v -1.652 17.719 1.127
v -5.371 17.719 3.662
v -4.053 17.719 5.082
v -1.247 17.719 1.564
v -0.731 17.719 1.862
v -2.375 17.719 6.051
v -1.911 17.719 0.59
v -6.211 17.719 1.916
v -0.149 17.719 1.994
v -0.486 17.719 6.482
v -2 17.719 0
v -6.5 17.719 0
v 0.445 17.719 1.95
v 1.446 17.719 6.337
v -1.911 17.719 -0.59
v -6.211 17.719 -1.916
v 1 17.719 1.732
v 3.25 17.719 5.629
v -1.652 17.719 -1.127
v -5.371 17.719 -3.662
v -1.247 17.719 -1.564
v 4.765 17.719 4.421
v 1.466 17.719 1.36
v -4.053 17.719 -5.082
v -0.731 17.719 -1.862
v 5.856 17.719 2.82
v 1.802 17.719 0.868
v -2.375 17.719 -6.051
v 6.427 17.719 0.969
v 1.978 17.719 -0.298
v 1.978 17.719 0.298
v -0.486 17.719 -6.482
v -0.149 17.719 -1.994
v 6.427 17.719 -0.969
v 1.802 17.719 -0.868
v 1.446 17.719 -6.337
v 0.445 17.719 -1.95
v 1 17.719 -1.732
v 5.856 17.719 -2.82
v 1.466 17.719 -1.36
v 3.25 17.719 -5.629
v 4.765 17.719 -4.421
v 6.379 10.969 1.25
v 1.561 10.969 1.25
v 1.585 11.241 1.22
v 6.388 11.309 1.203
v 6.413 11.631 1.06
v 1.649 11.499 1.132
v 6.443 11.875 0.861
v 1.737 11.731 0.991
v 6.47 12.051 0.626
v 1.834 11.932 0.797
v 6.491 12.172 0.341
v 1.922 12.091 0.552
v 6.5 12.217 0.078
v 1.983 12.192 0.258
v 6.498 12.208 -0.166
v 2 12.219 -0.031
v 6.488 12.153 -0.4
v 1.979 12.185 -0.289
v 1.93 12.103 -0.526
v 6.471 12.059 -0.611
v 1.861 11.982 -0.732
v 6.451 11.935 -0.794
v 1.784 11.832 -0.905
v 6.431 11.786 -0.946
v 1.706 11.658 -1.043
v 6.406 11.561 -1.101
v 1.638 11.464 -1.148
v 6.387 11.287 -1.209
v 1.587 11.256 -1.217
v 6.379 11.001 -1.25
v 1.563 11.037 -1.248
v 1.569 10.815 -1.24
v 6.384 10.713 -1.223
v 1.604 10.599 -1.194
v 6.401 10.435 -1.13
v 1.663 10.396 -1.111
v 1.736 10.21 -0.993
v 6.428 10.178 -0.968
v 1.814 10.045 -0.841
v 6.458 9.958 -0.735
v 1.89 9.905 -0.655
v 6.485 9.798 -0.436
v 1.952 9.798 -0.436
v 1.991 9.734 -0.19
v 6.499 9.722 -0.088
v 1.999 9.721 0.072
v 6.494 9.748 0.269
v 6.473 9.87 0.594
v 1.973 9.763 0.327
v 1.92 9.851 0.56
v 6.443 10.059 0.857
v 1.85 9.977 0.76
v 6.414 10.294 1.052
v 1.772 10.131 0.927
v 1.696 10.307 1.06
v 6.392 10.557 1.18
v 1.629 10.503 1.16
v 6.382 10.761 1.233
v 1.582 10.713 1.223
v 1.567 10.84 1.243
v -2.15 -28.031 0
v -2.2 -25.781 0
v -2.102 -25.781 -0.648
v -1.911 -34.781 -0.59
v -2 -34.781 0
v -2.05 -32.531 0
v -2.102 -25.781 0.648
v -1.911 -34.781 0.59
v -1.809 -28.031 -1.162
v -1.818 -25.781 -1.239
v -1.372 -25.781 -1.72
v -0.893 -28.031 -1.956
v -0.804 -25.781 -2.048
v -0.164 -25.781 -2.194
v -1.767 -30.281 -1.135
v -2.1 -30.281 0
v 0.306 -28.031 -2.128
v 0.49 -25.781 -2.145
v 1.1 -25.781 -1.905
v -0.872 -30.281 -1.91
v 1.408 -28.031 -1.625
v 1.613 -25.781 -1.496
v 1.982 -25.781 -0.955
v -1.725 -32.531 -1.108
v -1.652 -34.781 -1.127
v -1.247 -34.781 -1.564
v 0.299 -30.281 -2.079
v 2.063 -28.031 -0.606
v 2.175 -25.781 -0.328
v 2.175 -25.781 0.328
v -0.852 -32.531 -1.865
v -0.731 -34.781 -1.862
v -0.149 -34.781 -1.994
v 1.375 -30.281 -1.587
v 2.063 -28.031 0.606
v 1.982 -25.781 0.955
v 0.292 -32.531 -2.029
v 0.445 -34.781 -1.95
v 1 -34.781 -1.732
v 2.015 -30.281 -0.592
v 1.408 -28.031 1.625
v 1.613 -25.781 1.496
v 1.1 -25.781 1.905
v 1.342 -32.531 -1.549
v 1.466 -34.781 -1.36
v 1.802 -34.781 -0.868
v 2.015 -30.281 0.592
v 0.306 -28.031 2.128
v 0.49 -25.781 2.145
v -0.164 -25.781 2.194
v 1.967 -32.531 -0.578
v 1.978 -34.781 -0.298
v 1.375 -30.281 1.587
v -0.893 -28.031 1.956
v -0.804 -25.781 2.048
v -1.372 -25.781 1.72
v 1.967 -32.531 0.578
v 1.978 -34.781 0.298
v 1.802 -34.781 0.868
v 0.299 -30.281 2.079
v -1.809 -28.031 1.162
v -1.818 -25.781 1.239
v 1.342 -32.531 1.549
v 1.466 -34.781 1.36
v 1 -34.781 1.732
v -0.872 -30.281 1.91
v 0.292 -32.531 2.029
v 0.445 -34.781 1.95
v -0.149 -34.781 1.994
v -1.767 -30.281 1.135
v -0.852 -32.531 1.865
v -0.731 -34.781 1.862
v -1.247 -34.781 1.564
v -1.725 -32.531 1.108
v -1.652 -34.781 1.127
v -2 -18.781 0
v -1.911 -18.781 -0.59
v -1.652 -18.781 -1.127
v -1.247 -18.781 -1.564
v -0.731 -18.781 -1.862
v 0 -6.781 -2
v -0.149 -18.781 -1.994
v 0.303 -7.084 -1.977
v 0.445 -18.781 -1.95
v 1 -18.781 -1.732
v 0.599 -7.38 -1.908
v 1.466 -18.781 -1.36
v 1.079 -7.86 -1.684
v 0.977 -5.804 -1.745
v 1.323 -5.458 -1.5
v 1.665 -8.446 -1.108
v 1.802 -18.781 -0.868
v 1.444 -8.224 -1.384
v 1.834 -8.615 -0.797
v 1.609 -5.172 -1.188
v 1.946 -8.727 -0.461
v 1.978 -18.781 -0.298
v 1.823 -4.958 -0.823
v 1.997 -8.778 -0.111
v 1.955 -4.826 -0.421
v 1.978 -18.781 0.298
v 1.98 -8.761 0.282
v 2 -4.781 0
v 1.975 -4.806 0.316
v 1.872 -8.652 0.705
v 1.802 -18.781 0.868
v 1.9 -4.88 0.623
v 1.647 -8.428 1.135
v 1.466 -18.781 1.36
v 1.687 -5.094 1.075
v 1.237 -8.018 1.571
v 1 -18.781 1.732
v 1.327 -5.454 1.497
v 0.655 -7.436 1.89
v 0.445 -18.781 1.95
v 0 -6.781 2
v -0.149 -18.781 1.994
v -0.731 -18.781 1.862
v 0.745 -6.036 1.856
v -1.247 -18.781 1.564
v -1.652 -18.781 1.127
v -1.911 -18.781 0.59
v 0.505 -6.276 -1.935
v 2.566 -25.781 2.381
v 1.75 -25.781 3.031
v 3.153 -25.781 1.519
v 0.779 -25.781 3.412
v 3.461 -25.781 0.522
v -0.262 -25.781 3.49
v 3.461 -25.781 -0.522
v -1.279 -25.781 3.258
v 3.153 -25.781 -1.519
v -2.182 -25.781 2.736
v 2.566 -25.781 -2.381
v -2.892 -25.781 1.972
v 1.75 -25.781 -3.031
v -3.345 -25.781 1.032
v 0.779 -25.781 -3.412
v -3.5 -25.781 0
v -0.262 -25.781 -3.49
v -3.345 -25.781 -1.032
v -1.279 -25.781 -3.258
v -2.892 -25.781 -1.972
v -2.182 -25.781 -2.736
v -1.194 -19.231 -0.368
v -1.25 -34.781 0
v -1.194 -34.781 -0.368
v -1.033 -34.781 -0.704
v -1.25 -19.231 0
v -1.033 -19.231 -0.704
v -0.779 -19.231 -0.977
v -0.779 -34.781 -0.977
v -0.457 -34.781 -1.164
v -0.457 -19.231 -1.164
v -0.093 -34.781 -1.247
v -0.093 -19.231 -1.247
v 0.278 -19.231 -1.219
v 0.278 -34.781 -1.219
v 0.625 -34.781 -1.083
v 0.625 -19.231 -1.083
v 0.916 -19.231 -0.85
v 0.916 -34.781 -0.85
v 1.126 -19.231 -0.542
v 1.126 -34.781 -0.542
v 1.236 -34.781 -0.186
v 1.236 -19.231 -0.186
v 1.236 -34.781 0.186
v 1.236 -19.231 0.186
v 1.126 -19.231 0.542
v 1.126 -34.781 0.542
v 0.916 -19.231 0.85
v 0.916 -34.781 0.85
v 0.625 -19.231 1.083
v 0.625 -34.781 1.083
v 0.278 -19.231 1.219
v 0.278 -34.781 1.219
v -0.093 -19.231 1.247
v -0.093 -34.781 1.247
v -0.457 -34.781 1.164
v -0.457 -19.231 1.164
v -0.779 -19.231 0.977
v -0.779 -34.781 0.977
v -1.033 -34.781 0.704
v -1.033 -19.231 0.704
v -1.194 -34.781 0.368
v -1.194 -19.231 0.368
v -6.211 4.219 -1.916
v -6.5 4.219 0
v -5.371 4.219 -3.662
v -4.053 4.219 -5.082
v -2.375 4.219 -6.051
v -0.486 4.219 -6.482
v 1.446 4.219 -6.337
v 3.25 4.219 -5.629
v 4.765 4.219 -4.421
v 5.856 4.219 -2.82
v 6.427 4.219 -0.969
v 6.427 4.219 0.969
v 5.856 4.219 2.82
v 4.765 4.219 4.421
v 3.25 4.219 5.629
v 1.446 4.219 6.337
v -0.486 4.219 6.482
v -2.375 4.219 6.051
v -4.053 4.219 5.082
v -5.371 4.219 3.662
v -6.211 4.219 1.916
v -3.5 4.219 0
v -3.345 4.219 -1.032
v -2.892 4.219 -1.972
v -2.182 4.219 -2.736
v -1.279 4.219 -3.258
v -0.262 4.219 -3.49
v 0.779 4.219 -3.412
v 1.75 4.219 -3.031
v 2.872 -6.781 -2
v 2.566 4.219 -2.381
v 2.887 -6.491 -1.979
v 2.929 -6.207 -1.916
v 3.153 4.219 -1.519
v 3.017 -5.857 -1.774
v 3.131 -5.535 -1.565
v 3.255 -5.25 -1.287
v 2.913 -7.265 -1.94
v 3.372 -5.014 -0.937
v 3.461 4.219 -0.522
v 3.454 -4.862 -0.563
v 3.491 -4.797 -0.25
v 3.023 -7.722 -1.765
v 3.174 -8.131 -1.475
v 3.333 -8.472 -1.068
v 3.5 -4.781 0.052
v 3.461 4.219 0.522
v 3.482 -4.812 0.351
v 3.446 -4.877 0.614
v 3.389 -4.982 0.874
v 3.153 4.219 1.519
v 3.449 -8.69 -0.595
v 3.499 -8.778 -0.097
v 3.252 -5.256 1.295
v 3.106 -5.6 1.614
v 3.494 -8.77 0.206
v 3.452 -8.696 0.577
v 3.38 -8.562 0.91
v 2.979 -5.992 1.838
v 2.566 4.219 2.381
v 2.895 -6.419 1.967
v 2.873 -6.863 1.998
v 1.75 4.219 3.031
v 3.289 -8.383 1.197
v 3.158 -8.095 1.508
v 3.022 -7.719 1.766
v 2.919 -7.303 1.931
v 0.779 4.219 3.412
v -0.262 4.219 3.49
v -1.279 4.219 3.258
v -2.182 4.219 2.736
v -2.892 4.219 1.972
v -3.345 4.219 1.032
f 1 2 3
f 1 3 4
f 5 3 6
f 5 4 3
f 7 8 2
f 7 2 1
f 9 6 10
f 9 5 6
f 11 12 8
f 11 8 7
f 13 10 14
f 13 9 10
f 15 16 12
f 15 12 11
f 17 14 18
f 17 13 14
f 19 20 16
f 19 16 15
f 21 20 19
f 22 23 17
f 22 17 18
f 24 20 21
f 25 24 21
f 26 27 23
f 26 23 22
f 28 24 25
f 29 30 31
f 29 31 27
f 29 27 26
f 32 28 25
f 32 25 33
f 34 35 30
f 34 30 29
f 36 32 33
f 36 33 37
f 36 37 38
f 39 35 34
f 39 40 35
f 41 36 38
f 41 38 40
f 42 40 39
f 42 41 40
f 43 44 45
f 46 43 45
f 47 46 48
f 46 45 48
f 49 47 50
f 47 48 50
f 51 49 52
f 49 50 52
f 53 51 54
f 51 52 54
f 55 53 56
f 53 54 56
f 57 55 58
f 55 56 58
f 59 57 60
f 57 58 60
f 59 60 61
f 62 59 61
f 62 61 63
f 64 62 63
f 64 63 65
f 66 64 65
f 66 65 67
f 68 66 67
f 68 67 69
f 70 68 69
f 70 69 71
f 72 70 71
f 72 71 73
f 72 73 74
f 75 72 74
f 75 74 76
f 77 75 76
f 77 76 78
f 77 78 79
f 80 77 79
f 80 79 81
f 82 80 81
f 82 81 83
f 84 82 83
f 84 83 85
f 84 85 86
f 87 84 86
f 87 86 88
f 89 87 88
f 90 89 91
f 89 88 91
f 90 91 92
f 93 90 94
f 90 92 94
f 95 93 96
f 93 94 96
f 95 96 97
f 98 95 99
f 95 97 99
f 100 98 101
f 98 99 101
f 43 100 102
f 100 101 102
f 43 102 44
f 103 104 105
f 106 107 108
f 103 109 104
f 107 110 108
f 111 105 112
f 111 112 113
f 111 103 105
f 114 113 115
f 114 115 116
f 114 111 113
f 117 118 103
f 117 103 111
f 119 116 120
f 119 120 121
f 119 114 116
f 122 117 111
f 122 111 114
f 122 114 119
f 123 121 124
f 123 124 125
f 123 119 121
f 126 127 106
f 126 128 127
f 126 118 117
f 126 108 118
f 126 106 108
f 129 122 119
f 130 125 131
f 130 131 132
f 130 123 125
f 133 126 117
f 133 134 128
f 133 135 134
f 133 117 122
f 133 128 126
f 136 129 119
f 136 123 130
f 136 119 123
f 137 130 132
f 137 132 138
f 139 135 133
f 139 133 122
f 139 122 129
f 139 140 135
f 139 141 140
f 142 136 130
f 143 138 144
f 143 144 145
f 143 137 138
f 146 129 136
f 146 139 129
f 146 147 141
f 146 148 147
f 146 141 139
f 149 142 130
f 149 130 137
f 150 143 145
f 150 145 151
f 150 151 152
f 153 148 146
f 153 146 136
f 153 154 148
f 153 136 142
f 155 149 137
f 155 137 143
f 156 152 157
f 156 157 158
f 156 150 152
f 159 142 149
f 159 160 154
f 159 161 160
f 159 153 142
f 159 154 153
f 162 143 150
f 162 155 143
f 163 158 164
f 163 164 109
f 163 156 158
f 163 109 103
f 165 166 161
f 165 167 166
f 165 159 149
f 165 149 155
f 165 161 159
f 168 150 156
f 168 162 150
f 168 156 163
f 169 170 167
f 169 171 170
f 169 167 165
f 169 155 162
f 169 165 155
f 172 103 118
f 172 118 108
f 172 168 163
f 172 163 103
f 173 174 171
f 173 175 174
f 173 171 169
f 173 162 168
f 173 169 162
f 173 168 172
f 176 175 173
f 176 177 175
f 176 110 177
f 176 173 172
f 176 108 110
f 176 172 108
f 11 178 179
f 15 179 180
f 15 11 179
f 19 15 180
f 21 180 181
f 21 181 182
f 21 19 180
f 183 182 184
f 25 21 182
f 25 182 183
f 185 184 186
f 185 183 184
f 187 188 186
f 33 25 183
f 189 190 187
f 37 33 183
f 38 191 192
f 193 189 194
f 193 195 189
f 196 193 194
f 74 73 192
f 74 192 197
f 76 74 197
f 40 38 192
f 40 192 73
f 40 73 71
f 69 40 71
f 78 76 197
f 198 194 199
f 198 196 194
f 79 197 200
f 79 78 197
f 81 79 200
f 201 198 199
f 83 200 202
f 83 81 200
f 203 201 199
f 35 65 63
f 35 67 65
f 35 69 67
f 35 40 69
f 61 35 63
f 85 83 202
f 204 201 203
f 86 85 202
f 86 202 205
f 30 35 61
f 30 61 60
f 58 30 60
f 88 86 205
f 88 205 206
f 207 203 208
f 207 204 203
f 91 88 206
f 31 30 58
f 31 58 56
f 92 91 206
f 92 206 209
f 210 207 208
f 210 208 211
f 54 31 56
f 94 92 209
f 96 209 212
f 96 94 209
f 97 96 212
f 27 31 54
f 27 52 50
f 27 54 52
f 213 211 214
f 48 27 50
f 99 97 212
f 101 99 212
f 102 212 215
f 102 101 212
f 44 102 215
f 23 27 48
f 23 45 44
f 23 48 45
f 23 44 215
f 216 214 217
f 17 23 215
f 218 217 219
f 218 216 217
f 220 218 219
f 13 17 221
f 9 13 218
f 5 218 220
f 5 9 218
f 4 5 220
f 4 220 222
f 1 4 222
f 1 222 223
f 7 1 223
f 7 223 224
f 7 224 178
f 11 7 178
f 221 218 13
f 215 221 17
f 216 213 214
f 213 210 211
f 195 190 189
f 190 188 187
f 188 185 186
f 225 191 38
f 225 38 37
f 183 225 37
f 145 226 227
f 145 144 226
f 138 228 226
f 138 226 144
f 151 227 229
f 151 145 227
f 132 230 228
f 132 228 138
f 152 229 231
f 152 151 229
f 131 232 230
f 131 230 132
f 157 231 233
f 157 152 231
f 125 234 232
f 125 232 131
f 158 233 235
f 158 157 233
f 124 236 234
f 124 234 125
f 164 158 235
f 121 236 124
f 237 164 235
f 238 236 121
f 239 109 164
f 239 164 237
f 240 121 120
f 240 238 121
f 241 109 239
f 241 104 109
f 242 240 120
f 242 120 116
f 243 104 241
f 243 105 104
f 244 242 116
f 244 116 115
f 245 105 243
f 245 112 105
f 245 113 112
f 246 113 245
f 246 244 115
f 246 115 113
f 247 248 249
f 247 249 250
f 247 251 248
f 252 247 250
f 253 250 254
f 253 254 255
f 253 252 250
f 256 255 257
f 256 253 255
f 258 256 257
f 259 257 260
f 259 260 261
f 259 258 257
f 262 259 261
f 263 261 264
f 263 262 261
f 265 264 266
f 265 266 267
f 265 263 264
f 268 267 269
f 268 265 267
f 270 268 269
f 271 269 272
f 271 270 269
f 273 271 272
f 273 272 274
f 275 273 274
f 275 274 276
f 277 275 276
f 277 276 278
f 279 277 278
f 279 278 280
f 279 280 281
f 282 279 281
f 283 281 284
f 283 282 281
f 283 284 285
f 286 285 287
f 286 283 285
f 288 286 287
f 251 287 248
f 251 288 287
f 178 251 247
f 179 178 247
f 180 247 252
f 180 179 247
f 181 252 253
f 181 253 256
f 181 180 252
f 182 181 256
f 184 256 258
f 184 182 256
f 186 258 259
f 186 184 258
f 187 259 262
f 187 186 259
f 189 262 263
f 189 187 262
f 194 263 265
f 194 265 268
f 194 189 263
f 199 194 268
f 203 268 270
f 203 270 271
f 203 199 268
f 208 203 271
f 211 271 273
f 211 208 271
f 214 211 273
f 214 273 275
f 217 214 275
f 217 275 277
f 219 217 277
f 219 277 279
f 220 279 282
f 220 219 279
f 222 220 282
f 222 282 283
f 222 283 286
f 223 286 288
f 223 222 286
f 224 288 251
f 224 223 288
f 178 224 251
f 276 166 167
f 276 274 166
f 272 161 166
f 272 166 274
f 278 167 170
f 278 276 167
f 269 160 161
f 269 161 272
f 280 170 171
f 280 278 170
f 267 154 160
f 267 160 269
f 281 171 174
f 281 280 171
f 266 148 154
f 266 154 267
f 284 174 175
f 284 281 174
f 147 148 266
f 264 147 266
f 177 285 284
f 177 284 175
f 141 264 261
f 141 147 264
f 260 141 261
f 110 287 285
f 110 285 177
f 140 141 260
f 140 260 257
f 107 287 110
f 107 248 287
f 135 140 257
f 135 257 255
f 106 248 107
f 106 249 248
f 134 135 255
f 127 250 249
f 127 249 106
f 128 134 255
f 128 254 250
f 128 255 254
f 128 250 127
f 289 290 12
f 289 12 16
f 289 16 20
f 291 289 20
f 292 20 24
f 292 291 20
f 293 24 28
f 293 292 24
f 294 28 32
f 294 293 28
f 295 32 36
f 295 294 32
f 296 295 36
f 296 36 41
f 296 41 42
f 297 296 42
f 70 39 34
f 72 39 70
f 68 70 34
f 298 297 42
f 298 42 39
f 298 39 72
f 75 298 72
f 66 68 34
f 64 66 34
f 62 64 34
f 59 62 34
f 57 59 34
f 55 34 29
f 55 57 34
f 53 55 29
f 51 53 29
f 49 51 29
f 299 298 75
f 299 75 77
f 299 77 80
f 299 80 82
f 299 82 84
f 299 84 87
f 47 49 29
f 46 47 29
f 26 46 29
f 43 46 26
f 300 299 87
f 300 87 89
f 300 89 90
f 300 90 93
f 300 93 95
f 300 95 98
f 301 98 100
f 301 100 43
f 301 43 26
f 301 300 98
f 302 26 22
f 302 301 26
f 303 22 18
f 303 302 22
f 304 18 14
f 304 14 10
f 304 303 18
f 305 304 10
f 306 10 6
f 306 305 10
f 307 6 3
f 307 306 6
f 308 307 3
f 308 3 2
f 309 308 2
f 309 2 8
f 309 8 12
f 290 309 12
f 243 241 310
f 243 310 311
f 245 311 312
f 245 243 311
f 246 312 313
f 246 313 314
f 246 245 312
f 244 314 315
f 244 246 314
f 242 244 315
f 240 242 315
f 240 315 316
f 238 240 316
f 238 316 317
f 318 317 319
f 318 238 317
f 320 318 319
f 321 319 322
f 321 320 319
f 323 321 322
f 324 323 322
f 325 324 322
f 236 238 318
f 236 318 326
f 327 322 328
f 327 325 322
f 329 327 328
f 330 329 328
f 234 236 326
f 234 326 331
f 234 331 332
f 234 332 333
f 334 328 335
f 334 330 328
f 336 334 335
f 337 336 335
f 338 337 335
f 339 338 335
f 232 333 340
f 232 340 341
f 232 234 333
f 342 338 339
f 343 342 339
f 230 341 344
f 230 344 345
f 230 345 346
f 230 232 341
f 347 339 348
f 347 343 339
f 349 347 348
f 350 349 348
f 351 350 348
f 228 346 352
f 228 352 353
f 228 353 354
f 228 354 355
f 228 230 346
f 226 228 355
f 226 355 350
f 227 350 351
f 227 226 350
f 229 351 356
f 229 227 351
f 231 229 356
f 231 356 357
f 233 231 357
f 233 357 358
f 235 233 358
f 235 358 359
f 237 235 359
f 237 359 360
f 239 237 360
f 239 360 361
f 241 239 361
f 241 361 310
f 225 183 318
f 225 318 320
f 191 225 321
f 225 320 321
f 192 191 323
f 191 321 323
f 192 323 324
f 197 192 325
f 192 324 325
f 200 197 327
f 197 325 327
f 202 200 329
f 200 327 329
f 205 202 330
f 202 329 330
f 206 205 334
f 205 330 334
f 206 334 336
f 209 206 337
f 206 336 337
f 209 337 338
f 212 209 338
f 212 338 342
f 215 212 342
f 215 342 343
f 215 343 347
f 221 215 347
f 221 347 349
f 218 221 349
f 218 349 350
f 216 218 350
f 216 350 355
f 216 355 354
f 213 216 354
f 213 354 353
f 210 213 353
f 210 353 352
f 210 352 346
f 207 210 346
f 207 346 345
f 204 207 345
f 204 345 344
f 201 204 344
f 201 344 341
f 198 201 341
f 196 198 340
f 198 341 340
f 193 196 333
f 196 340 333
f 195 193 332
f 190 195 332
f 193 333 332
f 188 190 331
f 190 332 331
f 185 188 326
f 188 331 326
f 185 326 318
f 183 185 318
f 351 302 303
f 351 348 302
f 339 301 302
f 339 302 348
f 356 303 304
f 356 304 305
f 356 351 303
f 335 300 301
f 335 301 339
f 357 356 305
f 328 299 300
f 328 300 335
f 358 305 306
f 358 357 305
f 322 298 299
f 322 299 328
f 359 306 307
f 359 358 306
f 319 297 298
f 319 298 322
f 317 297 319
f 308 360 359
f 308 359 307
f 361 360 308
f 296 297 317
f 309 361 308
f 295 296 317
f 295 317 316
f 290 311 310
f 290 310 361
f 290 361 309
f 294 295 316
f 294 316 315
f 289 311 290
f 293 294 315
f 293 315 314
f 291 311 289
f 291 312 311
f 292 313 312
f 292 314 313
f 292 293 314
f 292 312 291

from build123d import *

# Parameters (mm, degrees)
SKETCH_2_R            = 2
CUT_EXTRUDE_1_DEPTH   = 3.5
HOLE_WIZARD_M31_D     = 2.5
HOLE_WIZARD_M31_DEPTH = 6
HOLE_WIZARD_M31_TIP   = 0.751075774


with BuildPart() as part:
    # Эскиз1 → Повернуть1 (revolve)
    with BuildSketch(Plane.XY):
        Polygon((-2, -34.780816616), (-1.25, -34.780816616), (-1.25, -19.23146208), (-2, -18.780816616), (-2, 17.719183384), (-6.5, 17.719183384), (-6.5, 4.219183384), (-3.5, 4.219183384), (-3.5, -25.780816616), (-2.2, -25.780816616), align=None)
    revolve(axis=Axis((0, 17.719183384, 0), (0, -1, 0)))

    # Эскиз2 → Вырез-Вытянуть1 (cut)
    with BuildSketch(Plane(origin=(3.5, 0, 0), x_dir=(0, 0, -1), z_dir=(1, 0, 0))):
        with Locations((0, -6.780816616)):
            Circle(SKETCH_2_R)
    extrude(amount=-CUT_EXTRUDE_1_DEPTH, mode=Mode.SUBTRACT)

    # Отверстие обработанное метчиком M31
    with Locations(Plane(origin=(6.5, 0, 0), x_dir=(0, 0, -1), z_dir=(1, 0, 0))):
        with Locations((0, 10.969183384)):
            Hole(HOLE_WIZARD_M31_D / 2, depth=HOLE_WIZARD_M31_DEPTH)
            with Locations((0, 0, -(HOLE_WIZARD_M31_DEPTH + HOLE_WIZARD_M31_TIP / 2))):  # 118° drill point
                Cone(0, HOLE_WIZARD_M31_D / 2, HOLE_WIZARD_M31_TIP, mode=Mode.SUBTRACT)


solid = part.part
